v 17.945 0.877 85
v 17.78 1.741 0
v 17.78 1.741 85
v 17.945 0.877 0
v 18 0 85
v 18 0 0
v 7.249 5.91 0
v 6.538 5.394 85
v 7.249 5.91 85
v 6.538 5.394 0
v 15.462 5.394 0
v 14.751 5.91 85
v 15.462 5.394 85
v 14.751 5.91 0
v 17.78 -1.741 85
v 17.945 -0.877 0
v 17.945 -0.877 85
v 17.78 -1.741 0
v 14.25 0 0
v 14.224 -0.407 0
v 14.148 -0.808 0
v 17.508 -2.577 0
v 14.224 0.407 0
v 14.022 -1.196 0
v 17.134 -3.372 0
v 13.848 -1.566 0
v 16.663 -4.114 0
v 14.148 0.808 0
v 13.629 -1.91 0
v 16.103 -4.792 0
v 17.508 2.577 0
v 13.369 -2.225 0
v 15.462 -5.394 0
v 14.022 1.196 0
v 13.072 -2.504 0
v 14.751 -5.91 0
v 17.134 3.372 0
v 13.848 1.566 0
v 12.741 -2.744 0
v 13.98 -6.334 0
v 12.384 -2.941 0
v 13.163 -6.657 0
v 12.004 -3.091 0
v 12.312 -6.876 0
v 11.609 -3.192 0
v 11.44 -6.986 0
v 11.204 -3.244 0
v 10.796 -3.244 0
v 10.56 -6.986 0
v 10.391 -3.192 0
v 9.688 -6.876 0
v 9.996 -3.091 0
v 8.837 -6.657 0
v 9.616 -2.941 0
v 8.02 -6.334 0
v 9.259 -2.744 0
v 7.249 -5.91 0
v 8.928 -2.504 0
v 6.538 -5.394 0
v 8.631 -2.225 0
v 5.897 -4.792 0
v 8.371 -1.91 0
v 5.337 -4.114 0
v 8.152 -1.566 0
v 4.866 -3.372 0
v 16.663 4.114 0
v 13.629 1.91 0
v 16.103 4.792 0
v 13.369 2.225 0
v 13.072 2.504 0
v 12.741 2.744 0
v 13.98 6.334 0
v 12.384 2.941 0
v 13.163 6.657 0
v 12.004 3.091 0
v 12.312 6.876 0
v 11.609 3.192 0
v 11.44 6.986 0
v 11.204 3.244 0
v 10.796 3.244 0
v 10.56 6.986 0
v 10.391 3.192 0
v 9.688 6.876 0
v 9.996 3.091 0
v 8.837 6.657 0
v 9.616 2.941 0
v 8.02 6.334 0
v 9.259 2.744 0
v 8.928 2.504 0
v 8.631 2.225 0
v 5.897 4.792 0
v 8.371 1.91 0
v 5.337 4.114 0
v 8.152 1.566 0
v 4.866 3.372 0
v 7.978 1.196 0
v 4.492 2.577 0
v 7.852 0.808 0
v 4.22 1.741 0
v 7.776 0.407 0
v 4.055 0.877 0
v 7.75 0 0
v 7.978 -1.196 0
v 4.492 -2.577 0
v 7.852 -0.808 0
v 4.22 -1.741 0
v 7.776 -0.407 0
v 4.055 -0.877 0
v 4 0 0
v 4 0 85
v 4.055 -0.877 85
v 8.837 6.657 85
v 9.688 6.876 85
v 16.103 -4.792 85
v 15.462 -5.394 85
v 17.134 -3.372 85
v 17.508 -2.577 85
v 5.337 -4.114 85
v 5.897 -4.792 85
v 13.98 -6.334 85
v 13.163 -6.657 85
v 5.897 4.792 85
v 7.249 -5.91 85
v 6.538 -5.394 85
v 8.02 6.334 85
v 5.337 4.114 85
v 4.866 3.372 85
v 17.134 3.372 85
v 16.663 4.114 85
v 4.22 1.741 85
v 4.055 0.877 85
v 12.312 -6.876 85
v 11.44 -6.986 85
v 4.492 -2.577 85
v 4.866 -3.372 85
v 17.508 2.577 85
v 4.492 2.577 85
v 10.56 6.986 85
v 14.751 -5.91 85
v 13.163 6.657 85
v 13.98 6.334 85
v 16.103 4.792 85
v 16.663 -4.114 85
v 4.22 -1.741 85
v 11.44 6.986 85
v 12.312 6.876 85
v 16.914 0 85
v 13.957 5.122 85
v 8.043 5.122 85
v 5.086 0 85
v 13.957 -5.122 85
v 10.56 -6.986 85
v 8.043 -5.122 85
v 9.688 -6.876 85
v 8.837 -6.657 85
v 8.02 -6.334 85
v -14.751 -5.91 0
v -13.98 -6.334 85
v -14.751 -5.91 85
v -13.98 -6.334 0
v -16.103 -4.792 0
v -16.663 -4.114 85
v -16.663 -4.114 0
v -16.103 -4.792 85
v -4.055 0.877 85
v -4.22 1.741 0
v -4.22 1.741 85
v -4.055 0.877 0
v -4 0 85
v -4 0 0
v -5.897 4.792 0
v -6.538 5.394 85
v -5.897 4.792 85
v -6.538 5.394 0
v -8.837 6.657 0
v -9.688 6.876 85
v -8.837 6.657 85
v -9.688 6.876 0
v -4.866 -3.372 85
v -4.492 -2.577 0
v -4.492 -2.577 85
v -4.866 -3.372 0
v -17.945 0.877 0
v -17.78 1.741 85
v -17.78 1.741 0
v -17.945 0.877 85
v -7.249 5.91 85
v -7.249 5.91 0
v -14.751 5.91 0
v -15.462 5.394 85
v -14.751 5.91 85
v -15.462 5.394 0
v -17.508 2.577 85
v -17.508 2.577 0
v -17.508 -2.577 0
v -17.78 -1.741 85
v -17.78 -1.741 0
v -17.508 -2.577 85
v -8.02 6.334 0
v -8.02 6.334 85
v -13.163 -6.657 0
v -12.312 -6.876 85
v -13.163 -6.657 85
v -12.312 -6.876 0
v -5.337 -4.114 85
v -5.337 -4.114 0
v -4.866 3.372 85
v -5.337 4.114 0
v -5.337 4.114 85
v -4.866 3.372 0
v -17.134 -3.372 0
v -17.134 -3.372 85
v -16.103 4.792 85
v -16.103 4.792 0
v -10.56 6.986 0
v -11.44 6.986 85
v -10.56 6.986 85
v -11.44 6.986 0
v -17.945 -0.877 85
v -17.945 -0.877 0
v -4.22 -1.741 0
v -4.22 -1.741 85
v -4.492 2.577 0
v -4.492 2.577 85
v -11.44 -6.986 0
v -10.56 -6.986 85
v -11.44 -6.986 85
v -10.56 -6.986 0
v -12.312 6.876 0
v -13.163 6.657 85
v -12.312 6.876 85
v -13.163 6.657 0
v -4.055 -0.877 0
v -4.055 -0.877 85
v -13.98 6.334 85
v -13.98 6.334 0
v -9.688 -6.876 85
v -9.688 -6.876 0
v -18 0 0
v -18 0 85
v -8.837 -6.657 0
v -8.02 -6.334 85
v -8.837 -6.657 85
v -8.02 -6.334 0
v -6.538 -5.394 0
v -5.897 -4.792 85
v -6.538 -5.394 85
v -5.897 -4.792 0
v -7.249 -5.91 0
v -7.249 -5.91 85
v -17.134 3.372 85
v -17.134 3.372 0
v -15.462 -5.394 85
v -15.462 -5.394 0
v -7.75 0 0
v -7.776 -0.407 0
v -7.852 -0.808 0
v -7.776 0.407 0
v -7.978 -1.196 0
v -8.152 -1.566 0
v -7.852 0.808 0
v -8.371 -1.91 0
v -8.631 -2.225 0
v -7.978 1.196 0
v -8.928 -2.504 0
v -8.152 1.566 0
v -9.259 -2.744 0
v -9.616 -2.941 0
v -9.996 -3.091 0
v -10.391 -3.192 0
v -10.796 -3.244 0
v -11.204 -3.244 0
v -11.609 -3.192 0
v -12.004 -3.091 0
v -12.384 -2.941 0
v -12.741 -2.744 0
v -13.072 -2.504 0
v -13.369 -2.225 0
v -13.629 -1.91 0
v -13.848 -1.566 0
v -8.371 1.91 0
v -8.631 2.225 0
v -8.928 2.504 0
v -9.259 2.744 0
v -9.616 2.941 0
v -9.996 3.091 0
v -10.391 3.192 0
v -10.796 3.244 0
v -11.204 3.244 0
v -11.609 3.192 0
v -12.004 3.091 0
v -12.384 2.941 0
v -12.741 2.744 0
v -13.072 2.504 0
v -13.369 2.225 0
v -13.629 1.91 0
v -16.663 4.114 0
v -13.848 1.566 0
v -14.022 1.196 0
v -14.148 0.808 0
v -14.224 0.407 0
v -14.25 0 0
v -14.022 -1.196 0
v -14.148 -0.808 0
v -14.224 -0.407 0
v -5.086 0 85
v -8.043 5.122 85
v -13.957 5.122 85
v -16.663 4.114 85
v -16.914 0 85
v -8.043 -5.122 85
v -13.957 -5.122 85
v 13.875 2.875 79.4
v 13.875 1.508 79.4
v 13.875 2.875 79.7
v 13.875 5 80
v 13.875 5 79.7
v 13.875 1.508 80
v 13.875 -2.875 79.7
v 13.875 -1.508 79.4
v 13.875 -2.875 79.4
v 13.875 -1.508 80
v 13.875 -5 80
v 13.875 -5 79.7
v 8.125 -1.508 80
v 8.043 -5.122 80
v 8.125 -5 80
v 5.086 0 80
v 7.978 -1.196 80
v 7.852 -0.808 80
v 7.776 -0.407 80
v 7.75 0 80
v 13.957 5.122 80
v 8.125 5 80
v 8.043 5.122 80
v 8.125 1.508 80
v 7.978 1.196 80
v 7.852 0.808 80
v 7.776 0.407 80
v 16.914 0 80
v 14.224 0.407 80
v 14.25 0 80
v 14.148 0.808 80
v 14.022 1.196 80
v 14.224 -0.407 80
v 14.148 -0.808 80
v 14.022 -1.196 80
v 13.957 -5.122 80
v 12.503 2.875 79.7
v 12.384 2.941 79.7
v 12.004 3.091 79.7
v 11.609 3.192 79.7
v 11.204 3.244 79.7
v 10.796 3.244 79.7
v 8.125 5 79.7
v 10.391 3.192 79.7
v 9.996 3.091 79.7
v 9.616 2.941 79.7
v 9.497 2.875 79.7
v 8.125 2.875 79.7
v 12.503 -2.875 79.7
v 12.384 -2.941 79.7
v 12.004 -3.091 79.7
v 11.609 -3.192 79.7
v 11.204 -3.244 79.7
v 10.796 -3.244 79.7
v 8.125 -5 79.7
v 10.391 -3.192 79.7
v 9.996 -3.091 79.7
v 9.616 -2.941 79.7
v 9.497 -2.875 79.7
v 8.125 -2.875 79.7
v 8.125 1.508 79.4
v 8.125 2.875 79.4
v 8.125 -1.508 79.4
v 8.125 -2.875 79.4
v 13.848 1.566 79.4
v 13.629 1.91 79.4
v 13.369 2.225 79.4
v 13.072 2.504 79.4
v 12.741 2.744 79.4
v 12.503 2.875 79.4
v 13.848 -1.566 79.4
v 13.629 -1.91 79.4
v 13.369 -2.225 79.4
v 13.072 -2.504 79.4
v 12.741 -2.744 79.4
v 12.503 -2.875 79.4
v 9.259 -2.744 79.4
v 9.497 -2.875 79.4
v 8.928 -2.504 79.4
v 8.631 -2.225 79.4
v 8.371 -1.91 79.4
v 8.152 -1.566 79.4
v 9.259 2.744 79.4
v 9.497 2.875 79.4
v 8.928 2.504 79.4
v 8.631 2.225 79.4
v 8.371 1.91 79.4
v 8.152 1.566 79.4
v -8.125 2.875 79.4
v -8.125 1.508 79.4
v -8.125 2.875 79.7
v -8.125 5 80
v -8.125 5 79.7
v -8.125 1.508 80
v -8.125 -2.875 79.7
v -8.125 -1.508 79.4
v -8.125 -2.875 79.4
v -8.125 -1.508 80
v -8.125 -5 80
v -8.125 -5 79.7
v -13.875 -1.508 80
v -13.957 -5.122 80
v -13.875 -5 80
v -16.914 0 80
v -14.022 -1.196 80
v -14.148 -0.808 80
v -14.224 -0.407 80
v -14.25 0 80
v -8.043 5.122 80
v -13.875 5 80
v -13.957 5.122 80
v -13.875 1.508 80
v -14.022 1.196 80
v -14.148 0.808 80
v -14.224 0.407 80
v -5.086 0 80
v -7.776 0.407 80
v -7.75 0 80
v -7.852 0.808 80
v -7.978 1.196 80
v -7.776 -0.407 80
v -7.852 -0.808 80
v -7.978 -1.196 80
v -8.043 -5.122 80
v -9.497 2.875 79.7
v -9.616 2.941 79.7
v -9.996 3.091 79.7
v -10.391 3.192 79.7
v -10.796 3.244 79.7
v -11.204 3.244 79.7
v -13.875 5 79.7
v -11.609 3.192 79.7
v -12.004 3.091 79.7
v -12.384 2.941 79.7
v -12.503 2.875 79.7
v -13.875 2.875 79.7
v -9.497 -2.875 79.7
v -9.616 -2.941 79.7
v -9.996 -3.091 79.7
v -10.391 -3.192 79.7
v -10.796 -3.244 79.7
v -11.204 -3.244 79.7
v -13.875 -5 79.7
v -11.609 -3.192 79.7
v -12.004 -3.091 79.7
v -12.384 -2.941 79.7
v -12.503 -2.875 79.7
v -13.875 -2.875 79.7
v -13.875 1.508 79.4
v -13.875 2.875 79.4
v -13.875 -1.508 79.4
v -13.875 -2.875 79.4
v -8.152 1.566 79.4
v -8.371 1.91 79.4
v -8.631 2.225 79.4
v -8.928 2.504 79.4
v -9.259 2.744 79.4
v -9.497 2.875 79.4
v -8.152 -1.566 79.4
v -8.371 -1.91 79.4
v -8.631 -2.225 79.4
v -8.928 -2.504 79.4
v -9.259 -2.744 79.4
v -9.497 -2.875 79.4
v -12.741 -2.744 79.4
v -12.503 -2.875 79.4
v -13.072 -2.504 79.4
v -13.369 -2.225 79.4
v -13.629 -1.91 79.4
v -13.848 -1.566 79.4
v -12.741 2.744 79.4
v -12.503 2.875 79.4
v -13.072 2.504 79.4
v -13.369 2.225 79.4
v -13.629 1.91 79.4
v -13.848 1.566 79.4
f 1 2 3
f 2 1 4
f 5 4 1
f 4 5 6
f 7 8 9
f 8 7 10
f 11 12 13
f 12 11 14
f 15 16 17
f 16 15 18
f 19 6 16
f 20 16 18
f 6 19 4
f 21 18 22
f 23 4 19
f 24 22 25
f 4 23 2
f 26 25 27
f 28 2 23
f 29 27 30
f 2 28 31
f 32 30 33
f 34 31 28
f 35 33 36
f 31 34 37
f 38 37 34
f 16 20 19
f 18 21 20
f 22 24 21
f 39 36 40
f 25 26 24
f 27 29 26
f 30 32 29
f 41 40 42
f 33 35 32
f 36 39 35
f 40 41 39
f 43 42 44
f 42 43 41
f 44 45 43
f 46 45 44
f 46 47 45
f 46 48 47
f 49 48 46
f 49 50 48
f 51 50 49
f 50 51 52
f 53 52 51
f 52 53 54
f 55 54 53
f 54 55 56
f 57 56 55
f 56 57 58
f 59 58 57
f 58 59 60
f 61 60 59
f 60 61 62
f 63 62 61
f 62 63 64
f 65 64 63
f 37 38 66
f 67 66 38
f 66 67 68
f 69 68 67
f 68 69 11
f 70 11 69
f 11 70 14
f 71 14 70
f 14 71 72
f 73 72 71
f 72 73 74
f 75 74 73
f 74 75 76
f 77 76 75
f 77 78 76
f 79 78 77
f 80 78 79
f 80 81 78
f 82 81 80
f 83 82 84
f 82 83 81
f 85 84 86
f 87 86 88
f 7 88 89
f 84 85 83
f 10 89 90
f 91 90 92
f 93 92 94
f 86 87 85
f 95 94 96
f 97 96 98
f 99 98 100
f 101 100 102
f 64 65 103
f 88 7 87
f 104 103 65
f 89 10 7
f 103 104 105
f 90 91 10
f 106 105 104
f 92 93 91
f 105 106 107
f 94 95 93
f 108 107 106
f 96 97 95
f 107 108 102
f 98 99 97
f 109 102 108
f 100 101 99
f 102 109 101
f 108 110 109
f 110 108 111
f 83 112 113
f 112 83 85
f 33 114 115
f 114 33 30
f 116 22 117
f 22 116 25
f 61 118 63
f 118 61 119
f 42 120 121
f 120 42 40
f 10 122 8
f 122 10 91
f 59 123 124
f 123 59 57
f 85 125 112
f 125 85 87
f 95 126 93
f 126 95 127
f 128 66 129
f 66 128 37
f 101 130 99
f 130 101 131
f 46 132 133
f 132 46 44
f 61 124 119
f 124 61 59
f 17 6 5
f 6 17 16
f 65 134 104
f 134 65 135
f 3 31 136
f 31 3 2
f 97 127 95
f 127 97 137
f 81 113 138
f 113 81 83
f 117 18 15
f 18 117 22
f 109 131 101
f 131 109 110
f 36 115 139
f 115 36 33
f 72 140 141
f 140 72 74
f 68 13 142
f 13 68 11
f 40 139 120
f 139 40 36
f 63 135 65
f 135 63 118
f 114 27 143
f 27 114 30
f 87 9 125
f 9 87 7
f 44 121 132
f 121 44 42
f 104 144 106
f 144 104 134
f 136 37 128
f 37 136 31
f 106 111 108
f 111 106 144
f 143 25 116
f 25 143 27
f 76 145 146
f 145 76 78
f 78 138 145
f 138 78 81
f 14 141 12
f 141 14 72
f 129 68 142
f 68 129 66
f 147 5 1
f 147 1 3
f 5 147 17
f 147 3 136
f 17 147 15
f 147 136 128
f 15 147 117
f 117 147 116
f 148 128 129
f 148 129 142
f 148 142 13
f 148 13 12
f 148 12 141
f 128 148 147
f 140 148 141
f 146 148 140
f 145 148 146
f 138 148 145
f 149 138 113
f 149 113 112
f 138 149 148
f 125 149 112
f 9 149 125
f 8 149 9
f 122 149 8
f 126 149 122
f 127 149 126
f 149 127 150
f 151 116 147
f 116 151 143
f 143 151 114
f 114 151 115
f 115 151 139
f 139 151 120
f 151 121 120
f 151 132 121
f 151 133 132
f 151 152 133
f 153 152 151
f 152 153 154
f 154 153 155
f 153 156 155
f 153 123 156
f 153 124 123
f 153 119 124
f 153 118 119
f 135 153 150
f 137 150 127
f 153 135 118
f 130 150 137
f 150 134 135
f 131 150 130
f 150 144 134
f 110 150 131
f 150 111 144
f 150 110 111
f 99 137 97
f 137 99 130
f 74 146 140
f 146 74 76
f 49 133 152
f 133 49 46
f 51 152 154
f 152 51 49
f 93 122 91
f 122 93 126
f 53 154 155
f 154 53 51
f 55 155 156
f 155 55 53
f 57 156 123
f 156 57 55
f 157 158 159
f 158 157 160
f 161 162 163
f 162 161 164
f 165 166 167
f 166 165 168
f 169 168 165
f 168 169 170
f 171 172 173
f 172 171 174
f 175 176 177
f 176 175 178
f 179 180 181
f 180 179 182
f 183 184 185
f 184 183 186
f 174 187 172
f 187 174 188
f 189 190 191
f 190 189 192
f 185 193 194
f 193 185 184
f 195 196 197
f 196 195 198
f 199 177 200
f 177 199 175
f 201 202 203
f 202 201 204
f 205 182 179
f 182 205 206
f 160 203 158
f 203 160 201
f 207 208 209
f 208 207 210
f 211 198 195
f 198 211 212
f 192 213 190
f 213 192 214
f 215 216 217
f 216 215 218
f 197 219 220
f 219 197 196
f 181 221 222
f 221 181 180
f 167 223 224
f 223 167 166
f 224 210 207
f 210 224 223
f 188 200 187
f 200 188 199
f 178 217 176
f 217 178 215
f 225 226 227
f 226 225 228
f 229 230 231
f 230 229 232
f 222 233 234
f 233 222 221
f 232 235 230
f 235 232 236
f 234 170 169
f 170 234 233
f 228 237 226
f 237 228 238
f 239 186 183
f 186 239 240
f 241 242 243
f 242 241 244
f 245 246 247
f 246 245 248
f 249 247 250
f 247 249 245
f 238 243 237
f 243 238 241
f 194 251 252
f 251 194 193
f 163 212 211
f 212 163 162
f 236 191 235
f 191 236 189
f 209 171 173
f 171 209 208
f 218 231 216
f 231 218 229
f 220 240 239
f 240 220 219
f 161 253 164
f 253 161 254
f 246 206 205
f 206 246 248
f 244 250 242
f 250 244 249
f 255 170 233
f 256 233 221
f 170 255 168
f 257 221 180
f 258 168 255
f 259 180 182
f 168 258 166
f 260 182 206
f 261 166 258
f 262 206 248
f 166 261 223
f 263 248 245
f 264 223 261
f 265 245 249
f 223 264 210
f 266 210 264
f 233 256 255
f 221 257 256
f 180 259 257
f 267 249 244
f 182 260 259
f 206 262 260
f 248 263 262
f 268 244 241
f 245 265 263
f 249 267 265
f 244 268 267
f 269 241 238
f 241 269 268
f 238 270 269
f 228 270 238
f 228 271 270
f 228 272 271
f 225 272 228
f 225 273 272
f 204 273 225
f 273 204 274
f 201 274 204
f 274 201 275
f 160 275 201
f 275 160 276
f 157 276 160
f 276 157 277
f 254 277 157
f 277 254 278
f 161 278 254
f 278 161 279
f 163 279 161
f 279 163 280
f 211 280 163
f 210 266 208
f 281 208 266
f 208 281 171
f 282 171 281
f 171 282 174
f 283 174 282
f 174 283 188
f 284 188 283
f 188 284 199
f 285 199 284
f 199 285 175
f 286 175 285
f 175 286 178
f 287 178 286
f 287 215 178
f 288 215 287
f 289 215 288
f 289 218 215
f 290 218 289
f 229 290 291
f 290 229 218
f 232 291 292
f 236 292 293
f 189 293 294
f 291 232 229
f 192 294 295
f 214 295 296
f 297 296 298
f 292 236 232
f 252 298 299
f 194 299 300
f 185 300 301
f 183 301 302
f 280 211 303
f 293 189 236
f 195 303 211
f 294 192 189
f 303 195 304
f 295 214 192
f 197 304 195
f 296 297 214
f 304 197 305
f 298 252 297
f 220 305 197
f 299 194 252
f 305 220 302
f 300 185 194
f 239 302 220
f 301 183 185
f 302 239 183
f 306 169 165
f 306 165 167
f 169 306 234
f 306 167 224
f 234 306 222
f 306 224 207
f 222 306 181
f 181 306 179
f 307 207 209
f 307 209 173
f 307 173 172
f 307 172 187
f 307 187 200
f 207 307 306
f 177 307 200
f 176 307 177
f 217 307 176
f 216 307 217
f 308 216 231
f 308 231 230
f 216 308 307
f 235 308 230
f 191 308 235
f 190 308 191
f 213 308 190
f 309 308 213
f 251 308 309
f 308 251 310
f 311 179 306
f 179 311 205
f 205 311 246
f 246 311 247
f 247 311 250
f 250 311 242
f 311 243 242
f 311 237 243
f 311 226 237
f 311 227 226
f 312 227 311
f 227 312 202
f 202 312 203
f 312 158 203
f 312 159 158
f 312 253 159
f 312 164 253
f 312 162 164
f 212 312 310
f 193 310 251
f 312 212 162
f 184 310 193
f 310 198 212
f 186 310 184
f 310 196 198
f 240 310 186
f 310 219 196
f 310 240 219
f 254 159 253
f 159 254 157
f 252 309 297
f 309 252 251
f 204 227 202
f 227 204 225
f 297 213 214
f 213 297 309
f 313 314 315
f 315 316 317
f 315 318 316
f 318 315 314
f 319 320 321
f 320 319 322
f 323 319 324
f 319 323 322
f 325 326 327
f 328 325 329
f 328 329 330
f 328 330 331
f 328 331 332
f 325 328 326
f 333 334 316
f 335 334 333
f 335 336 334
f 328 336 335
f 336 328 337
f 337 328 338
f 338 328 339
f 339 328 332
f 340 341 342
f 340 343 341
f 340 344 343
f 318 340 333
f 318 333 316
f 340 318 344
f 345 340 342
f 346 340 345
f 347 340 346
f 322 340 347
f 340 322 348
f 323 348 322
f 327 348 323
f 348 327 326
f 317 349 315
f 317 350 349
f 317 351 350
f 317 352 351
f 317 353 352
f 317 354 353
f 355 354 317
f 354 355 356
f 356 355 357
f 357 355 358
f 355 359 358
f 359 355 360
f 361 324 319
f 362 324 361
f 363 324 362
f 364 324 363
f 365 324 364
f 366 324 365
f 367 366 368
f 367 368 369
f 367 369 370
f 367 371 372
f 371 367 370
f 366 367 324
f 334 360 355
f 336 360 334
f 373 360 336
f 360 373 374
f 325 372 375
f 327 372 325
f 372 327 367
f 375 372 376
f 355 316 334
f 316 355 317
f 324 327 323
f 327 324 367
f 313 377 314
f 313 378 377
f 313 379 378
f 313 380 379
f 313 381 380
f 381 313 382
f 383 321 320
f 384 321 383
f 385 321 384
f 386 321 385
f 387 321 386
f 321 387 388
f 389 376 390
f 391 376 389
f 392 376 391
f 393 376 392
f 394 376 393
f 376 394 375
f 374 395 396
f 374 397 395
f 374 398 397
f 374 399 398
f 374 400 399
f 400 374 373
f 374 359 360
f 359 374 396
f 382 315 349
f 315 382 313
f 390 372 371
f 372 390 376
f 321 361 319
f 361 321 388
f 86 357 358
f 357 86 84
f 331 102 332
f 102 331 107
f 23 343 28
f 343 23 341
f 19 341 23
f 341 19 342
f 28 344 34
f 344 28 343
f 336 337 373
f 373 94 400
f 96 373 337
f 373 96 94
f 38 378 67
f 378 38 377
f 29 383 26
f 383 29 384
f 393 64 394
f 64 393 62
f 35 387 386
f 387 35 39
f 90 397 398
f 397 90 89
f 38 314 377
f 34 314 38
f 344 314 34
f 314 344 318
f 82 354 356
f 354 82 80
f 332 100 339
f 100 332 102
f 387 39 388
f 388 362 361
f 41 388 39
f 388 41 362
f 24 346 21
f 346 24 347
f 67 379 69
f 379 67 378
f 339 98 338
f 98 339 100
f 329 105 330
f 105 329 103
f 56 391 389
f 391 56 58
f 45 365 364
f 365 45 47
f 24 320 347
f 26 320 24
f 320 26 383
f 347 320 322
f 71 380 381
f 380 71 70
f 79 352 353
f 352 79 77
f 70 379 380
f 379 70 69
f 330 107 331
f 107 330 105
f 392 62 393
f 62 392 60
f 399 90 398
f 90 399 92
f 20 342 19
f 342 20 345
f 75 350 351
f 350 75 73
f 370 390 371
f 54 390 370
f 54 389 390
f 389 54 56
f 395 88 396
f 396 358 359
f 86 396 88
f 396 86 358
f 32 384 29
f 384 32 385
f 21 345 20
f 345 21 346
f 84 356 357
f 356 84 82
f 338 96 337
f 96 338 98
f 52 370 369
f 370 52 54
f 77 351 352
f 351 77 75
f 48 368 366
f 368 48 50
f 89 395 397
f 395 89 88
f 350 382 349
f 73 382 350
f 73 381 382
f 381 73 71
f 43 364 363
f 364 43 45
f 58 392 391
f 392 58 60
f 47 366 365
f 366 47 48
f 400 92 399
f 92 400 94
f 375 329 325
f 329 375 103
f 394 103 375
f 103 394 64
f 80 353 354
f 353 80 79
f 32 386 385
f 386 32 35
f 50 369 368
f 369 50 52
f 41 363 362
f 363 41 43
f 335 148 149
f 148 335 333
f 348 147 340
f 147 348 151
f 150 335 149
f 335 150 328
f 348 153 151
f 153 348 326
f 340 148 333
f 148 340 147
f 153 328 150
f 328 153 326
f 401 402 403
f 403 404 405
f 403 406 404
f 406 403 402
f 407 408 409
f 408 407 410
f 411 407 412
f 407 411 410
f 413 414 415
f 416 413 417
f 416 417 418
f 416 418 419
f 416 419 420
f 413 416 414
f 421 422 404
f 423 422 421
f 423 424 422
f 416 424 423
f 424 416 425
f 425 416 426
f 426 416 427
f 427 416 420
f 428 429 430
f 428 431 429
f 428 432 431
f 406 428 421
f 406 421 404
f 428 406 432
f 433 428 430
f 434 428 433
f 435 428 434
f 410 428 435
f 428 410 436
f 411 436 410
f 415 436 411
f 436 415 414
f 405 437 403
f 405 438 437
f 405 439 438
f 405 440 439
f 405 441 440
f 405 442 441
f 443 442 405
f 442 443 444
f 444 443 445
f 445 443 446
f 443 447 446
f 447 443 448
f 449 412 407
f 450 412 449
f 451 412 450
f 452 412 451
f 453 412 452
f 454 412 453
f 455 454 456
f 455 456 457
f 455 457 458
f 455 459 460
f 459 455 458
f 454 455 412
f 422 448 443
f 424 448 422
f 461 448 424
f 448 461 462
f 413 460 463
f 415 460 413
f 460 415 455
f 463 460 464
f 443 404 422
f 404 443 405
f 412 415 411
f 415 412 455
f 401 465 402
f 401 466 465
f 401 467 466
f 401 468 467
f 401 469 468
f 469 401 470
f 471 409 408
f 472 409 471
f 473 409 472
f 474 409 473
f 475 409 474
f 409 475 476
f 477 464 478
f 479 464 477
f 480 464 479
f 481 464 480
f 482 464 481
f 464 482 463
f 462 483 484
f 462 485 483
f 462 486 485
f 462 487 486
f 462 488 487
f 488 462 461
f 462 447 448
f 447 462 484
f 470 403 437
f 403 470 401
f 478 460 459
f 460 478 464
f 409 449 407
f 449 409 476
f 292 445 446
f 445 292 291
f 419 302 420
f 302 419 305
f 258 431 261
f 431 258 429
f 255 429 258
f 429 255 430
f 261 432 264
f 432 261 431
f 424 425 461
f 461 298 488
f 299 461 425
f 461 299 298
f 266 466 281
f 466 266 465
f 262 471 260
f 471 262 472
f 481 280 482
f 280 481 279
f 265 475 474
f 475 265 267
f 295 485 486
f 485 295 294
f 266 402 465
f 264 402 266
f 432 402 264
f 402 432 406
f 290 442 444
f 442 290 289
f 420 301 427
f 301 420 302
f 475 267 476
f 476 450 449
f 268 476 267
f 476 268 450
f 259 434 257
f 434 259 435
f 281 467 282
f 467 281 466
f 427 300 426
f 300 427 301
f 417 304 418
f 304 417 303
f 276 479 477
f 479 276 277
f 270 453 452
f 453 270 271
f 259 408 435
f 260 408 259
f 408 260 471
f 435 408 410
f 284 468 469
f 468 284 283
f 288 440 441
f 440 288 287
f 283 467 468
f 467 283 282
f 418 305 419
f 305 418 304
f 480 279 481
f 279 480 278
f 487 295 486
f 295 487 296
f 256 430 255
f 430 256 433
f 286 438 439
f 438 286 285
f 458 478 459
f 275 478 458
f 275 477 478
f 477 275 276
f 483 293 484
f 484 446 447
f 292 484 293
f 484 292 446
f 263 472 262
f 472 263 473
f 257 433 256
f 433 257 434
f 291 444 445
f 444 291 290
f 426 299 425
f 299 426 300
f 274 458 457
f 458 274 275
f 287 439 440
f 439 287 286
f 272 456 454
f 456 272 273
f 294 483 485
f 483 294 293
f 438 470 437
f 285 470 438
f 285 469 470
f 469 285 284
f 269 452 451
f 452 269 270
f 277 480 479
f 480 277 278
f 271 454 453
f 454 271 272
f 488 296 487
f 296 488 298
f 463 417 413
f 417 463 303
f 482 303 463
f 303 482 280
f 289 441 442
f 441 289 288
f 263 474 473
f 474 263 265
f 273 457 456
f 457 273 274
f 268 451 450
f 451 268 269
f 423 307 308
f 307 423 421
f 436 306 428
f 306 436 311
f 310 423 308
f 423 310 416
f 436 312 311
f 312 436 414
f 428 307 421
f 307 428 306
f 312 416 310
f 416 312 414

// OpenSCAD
$fn = 50;


difference() {
	union() {
		translate(v = [11.0000000000, 0, 0.0000000000]) {
			cylinder(h = 85, r = 7.0000000000);
		}
		translate(v = [-11.0000000000, 0, 0.0000000000]) {
			cylinder(h = 85, r = 7.0000000000);
		}
	}
	union() {
		translate(v = [11.0000000000, 0, 85]) {
			rotate(a = [0, 0, 0]) {
				difference() {
					union() {
						#translate(v = [-2.8750000000, -5.0000000000, -5.3000000000]) {
							cube(size = [5.7500000000, 10, 0.3000000000]);
						}
						#translate(v = [-2.8750000000, -2.8750000000, -5.6000000000]) {
							cube(size = [5.7500000000, 5.7500000000, 0.3000000000]);
						}
						#translate(v = [-2.8750000000, -5.0000000000, 0]) {
							cube(size = [5.7500000000, 10, 0.3000000000]);
						}
						#translate(v = [-2.8750000000, -2.8750000000, 0.3000000000]) {
							cube(size = [5.7500000000, 5.7500000000, 0.3000000000]);
						}
						#translate(v = [0, 0, -100.0000000000]) {
							cylinder(h = 200, r = 3.2500000000);
						}
						translate(v = [0, 0, -5]) {
							#linear_extrude(height = 5) {
								polygon(points = [[5.9142500000, 0.0000000000], [2.9571250000, 5.1218907443], [-2.9571250000, 5.1218907443], [-5.9142500000, 0.0000000000], [-2.9571250000, -5.1218907443], [2.9571250000, -5.1218907443]]);
							}
						}
						#translate(v = [-2.8750000000, -5.0000000000, -5.3000000000]) {
							cube(size = [5.7500000000, 10, 0.3000000000]);
						}
						#translate(v = [-2.8750000000, -2.8750000000, -5.6000000000]) {
							cube(size = [5.7500000000, 5.7500000000, 0.3000000000]);
						}
						#translate(v = [-2.8750000000, -5.0000000000, 0]) {
							cube(size = [5.7500000000, 10, 0.3000000000]);
						}
						#translate(v = [-2.8750000000, -2.8750000000, 0.3000000000]) {
							cube(size = [5.7500000000, 5.7500000000, 0.3000000000]);
						}
						#translate(v = [0, 0, -100.0000000000]) {
							cylinder(h = 200, r = 3.2500000000);
						}
						#translate(v = [-2.8750000000, -5.0000000000, -5.3000000000]) {
							cube(size = [5.7500000000, 10, 0.3000000000]);
						}
						#translate(v = [-2.8750000000, -2.8750000000, -5.6000000000]) {
							cube(size = [5.7500000000, 5.7500000000, 0.3000000000]);
						}
						#translate(v = [-2.8750000000, -5.0000000000, 0]) {
							cube(size = [5.7500000000, 10, 0.3000000000]);
						}
						#translate(v = [-2.8750000000, -2.8750000000, 0.3000000000]) {
							cube(size = [5.7500000000, 5.7500000000, 0.3000000000]);
						}
						#translate(v = [0, 0, -100.0000000000]) {
							cylinder(h = 200, r = 3.2500000000);
						}
					}
					union();
				}
			}
		}
		translate(v = [-11.0000000000, 0, 85]) {
			rotate(a = [0, 0, 0]) {
				difference() {
					union() {
						#translate(v = [-2.8750000000, -5.0000000000, -5.3000000000]) {
							cube(size = [5.7500000000, 10, 0.3000000000]);
						}
						#translate(v = [-2.8750000000, -2.8750000000, -5.6000000000]) {
							cube(size = [5.7500000000, 5.7500000000, 0.3000000000]);
						}
						#translate(v = [-2.8750000000, -5.0000000000, 0]) {
							cube(size = [5.7500000000, 10, 0.3000000000]);
						}
						#translate(v = [-2.8750000000, -2.8750000000, 0.3000000000]) {
							cube(size = [5.7500000000, 5.7500000000, 0.3000000000]);
						}
						#translate(v = [0, 0, -100.0000000000]) {
							cylinder(h = 200, r = 3.2500000000);
						}
						translate(v = [0, 0, -5]) {
							#linear_extrude(height = 5) {
								polygon(points = [[5.9142500000, 0.0000000000], [2.9571250000, 5.1218907443], [-2.9571250000, 5.1218907443], [-5.9142500000, 0.0000000000], [-2.9571250000, -5.1218907443], [2.9571250000, -5.1218907443]]);
							}
						}
						#translate(v = [-2.8750000000, -5.0000000000, -5.3000000000]) {
							cube(size = [5.7500000000, 10, 0.3000000000]);
						}
						#translate(v = [-2.8750000000, -2.8750000000, -5.6000000000]) {
							cube(size = [5.7500000000, 5.7500000000, 0.3000000000]);
						}
						#translate(v = [-2.8750000000, -5.0000000000, 0]) {
							cube(size = [5.7500000000, 10, 0.3000000000]);
						}
						#translate(v = [-2.8750000000, -2.8750000000, 0.3000000000]) {
							cube(size = [5.7500000000, 5.7500000000, 0.3000000000]);
						}
						#translate(v = [0, 0, -100.0000000000]) {
							cylinder(h = 200, r = 3.2500000000);
						}
						#translate(v = [-2.8750000000, -5.0000000000, -5.3000000000]) {
							cube(size = [5.7500000000, 10, 0.3000000000]);
						}
						#translate(v = [-2.8750000000, -2.8750000000, -5.6000000000]) {
							cube(size = [5.7500000000, 5.7500000000, 0.3000000000]);
						}
						#translate(v = [-2.8750000000, -5.0000000000, 0]) {
							cube(size = [5.7500000000, 10, 0.3000000000]);
						}
						#translate(v = [-2.8750000000, -2.8750000000, 0.3000000000]) {
							cube(size = [5.7500000000, 5.7500000000, 0.3000000000]);
						}
						#translate(v = [0, 0, -100.0000000000]) {
							cylinder(h = 200, r = 3.2500000000);
						}
					}
					union();
				}
			}
		}
	}
}
